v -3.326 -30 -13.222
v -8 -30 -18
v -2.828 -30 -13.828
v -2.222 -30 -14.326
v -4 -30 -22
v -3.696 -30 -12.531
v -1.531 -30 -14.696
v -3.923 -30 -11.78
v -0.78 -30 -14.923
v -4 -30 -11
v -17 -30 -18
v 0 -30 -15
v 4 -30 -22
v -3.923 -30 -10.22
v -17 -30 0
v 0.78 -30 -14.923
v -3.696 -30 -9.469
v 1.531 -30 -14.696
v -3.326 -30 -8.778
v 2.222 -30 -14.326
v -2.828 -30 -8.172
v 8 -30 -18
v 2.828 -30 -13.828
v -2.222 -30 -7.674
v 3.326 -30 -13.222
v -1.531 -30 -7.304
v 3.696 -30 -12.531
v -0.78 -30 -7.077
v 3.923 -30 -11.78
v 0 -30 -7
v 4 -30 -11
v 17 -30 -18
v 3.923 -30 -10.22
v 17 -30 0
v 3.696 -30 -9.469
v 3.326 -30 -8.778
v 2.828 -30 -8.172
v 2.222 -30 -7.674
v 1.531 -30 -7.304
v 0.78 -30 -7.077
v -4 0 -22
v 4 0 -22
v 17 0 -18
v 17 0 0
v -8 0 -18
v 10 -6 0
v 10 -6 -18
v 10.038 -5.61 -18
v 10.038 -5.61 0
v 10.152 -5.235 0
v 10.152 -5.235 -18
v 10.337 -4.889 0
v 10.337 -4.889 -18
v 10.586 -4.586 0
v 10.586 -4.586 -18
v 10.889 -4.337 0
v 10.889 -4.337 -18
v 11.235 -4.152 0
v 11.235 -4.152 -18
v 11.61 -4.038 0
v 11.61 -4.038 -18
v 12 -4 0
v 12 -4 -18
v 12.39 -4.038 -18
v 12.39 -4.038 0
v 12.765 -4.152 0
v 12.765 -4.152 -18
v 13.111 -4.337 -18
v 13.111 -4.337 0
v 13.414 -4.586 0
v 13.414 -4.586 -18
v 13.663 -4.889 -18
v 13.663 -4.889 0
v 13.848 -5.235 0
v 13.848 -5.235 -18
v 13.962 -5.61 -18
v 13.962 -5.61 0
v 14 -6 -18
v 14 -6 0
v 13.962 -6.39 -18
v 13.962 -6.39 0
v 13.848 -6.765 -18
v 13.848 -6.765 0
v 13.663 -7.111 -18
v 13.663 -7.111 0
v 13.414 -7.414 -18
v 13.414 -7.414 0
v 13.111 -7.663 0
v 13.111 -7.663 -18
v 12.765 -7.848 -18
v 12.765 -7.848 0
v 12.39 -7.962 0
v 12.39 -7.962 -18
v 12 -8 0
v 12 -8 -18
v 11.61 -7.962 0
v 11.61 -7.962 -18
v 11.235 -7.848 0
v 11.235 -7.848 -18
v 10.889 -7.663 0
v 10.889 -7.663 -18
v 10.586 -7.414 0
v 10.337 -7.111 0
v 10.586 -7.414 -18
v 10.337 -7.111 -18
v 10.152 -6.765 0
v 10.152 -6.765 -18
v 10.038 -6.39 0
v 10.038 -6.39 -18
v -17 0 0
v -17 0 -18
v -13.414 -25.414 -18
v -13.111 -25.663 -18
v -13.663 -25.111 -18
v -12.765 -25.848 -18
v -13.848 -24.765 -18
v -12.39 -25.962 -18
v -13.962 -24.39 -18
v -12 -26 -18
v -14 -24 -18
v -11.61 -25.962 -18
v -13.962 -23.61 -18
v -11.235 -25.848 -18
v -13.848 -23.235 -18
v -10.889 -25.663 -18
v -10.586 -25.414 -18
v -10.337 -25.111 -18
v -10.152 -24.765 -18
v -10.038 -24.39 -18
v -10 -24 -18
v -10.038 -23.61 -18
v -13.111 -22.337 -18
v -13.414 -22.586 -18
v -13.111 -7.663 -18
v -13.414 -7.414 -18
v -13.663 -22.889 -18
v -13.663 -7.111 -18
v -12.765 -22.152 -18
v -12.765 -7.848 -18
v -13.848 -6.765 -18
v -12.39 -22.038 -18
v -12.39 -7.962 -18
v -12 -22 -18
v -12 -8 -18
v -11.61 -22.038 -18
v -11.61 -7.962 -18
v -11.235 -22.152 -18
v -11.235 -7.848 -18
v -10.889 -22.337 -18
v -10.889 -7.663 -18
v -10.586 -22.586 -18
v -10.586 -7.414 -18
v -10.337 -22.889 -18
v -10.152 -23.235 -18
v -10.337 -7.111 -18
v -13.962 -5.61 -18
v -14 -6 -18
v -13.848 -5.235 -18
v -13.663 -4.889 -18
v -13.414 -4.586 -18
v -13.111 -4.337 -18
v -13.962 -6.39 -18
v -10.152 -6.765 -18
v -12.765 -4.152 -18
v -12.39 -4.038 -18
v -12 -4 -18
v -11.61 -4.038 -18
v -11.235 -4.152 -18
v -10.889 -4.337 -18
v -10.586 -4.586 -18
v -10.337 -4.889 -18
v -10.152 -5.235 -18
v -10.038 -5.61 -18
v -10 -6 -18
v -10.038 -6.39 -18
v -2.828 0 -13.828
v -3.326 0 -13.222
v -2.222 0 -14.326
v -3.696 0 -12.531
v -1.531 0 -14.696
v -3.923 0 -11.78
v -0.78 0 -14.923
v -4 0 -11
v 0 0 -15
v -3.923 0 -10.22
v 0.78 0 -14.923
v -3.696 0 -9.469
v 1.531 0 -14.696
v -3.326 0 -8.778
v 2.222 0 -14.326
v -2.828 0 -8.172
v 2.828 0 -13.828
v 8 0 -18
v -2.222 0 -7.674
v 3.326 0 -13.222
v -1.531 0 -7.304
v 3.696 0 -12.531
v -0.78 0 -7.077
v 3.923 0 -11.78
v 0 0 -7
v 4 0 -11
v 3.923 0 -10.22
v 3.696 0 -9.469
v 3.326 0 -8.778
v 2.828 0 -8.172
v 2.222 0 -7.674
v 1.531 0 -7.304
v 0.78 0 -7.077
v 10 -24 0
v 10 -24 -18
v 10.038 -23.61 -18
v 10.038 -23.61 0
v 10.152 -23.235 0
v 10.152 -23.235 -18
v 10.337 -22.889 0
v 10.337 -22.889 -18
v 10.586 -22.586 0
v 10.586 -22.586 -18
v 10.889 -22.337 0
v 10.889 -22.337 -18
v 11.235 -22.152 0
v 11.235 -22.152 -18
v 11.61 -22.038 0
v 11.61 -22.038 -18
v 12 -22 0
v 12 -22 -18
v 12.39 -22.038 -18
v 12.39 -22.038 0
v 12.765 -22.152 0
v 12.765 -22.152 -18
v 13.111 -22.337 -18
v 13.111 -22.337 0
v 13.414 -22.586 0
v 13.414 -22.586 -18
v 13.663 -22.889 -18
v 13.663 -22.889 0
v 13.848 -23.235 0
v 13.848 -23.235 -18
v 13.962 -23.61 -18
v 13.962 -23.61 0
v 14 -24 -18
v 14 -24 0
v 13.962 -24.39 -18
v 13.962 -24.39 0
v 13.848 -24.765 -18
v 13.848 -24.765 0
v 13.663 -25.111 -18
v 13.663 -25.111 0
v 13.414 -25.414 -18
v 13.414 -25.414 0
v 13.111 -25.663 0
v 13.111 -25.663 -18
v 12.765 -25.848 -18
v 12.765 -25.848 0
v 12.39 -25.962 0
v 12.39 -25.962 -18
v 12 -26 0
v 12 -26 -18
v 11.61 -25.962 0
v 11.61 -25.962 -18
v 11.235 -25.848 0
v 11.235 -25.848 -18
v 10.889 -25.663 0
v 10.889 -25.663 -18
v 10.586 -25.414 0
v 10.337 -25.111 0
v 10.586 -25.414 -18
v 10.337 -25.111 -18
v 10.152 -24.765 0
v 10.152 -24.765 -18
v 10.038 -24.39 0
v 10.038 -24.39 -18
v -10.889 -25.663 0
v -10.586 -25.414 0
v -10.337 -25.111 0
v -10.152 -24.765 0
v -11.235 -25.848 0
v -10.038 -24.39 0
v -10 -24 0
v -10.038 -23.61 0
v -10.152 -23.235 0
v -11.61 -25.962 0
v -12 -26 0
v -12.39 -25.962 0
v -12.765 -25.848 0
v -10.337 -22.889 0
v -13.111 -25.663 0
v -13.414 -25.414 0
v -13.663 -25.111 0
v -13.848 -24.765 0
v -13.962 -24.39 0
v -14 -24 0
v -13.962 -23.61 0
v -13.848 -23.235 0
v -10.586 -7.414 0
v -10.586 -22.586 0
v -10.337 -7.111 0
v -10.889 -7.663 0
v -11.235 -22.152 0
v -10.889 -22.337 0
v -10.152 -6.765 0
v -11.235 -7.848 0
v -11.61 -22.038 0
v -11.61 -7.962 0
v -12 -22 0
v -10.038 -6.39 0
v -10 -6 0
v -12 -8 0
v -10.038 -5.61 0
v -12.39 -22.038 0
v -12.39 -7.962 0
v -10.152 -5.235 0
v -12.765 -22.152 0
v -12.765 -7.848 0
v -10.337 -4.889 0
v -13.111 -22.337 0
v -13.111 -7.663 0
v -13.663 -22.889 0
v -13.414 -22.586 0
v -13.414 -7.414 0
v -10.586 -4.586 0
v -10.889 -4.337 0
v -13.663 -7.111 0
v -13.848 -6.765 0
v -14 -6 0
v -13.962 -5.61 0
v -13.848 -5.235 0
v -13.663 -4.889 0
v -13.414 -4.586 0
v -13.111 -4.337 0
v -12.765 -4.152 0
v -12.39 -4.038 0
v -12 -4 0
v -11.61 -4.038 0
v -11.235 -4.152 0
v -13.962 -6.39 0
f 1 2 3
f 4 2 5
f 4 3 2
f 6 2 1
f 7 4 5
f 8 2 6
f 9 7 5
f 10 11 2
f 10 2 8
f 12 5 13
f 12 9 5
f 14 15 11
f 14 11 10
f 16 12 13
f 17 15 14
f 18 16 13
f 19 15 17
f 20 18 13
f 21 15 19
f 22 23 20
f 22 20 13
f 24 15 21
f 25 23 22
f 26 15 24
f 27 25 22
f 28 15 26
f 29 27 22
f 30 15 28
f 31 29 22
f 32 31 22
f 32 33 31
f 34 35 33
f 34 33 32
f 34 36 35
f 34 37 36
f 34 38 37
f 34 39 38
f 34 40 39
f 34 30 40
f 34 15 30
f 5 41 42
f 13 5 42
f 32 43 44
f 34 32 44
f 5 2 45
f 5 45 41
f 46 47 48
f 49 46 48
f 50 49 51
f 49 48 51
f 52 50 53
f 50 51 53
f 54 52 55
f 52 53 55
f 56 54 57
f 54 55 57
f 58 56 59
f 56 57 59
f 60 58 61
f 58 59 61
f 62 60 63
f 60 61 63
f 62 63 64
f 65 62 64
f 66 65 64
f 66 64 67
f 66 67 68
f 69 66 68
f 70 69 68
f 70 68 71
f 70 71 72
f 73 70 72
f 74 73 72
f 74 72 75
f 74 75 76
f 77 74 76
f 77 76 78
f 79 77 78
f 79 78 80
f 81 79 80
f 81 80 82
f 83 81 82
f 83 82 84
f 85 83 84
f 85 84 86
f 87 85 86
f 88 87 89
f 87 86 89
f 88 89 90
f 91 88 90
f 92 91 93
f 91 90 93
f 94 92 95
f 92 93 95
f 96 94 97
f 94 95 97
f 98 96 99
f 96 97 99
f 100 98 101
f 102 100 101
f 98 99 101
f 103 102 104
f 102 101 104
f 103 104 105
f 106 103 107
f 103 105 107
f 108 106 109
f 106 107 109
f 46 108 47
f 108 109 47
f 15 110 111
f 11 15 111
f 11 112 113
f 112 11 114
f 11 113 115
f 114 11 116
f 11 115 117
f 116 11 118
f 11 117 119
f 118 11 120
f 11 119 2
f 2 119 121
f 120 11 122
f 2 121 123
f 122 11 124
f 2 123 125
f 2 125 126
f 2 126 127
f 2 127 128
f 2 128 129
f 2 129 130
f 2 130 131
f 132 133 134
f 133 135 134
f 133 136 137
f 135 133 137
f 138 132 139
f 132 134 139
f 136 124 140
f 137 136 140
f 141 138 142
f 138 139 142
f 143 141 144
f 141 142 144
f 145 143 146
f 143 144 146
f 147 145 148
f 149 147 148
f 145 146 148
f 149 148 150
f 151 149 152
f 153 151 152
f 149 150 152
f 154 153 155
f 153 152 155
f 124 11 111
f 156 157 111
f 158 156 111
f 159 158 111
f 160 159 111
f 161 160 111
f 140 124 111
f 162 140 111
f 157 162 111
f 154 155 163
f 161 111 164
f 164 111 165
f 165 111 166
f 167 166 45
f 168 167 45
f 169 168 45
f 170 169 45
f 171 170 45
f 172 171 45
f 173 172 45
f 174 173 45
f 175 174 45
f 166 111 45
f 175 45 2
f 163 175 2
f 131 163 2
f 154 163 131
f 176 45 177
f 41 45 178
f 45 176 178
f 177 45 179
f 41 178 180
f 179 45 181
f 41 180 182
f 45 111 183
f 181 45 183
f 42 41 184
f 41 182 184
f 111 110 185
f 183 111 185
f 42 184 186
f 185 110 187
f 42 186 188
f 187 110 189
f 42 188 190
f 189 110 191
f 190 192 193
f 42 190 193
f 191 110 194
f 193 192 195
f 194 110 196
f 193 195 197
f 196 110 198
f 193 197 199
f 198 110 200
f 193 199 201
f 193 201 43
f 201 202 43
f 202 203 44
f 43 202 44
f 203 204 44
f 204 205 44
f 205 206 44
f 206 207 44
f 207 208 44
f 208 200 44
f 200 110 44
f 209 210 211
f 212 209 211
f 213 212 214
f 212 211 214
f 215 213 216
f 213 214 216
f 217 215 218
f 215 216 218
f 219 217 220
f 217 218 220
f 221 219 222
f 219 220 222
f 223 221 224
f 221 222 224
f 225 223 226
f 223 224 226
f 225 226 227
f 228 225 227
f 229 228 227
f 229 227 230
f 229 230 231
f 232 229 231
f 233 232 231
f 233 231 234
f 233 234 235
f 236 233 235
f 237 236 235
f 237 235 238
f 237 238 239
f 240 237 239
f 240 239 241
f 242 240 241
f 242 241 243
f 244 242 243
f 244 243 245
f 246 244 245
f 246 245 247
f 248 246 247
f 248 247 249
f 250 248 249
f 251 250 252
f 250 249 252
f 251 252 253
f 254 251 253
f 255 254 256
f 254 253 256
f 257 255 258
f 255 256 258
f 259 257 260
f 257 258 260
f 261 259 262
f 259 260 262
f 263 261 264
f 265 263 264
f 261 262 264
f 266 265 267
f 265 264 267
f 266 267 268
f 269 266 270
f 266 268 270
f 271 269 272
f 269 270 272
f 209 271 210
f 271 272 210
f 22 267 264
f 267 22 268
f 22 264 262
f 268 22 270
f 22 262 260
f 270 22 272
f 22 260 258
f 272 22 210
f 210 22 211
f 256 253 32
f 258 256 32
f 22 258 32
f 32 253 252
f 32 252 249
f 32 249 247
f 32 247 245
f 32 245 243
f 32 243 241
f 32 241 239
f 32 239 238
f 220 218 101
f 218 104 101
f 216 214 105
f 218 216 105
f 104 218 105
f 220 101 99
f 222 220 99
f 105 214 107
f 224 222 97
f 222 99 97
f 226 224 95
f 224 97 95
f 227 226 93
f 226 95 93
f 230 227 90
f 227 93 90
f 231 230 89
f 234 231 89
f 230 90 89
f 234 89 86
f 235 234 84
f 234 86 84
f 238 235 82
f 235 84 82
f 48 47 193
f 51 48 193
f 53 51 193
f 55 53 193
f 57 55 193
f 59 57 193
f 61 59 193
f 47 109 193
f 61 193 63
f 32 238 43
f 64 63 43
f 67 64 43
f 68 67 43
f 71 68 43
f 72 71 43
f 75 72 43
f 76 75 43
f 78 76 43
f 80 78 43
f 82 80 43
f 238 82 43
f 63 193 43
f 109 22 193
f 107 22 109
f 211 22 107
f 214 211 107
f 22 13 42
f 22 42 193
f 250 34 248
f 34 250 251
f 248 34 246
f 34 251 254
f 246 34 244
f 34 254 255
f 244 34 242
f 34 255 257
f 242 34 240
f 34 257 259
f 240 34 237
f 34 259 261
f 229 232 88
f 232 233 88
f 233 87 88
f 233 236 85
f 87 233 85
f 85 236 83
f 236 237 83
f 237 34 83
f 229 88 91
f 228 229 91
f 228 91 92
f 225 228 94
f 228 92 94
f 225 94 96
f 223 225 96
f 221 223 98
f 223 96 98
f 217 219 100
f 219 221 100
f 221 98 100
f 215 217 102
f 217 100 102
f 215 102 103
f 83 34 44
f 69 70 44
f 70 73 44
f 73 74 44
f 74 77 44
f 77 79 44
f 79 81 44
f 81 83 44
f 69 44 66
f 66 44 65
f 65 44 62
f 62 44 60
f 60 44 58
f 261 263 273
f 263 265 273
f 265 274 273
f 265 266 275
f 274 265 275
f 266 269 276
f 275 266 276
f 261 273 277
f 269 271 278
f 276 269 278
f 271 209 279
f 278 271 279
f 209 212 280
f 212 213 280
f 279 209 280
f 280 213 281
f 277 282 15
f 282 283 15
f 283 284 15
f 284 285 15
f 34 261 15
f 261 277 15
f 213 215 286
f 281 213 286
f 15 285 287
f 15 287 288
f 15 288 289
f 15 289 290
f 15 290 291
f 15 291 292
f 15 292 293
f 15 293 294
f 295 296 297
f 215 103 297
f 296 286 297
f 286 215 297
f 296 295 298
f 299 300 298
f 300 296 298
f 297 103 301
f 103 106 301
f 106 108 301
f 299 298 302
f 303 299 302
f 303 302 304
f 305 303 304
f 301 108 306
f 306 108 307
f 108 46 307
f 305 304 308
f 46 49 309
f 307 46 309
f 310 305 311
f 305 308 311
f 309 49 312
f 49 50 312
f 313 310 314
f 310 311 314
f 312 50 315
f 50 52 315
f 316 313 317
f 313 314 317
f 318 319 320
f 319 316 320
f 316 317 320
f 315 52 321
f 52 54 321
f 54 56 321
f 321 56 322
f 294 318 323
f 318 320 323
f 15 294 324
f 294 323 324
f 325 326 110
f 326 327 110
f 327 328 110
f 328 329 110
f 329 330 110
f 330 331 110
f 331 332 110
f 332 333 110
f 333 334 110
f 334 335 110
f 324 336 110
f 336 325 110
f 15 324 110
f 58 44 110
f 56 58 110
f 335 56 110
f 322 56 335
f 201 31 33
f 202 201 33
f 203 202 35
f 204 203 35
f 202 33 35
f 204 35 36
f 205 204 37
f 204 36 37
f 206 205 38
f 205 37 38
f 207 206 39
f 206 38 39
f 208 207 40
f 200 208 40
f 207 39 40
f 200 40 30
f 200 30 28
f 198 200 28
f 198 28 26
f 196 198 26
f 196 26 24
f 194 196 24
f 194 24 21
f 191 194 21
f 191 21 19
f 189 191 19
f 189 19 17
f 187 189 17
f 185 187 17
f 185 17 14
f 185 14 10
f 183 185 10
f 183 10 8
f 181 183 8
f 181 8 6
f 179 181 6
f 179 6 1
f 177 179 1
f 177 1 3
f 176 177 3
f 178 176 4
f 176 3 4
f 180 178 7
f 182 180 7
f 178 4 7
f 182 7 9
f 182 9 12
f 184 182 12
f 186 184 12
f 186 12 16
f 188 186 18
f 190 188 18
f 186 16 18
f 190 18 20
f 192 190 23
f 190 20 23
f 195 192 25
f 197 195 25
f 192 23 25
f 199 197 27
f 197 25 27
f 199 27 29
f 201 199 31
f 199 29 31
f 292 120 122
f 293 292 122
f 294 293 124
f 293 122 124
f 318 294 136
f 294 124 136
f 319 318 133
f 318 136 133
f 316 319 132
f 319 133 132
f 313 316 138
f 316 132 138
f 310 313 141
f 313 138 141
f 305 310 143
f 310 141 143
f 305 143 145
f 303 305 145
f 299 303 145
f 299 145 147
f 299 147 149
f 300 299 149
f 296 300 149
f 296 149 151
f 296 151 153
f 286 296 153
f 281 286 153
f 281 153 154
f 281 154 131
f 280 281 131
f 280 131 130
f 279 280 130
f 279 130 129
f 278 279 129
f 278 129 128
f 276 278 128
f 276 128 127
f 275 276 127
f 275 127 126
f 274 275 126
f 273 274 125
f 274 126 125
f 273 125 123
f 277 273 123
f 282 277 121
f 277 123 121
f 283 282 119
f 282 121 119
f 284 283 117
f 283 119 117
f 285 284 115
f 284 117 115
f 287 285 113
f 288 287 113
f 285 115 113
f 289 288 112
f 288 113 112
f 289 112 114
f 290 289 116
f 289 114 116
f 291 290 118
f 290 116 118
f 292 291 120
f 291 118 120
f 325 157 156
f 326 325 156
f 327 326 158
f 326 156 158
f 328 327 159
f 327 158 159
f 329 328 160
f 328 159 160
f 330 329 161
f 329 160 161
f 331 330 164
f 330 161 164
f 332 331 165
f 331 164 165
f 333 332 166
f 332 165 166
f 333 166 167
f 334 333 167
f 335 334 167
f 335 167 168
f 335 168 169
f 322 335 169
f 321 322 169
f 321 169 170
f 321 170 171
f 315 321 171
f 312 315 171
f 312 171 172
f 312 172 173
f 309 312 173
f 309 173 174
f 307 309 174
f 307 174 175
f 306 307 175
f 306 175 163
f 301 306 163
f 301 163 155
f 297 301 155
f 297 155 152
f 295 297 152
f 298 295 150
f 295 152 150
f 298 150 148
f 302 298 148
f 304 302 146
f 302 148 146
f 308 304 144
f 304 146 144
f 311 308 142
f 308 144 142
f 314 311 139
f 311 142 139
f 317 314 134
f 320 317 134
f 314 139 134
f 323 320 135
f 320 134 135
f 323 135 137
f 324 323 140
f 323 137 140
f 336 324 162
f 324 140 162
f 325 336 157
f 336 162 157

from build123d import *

# Parameters (mm, degrees)
F1_DEPTH = 30
F3_D     = 8
F5_D     = 4


with BuildPart() as f1:
    # F0 (on Front) → F1 (new body)
    with BuildSketch(Plane.XZ):
        Polygon((17, 0), (-17, 0), (-17, -18), (-8, -18), (-4, -22), (4, -22), (8, -18), (17, -18), align=None)
    extrude(amount=F1_DEPTH)

    # F3 (through all)
    with Locations(Plane(origin=(0, 0, 0), x_dir=(-1, 0, 0), z_dir=(0, 1, 0))):
        with Locations((0, -11)):
            Hole(F3_D / 2)

    # F5 (through all)
    with Locations(Plane.XY):
        with Locations((12, -24), (12, -6), (-12, -6), (-12, -24)):
            Hole(F5_D / 2)


solid = f1.part
